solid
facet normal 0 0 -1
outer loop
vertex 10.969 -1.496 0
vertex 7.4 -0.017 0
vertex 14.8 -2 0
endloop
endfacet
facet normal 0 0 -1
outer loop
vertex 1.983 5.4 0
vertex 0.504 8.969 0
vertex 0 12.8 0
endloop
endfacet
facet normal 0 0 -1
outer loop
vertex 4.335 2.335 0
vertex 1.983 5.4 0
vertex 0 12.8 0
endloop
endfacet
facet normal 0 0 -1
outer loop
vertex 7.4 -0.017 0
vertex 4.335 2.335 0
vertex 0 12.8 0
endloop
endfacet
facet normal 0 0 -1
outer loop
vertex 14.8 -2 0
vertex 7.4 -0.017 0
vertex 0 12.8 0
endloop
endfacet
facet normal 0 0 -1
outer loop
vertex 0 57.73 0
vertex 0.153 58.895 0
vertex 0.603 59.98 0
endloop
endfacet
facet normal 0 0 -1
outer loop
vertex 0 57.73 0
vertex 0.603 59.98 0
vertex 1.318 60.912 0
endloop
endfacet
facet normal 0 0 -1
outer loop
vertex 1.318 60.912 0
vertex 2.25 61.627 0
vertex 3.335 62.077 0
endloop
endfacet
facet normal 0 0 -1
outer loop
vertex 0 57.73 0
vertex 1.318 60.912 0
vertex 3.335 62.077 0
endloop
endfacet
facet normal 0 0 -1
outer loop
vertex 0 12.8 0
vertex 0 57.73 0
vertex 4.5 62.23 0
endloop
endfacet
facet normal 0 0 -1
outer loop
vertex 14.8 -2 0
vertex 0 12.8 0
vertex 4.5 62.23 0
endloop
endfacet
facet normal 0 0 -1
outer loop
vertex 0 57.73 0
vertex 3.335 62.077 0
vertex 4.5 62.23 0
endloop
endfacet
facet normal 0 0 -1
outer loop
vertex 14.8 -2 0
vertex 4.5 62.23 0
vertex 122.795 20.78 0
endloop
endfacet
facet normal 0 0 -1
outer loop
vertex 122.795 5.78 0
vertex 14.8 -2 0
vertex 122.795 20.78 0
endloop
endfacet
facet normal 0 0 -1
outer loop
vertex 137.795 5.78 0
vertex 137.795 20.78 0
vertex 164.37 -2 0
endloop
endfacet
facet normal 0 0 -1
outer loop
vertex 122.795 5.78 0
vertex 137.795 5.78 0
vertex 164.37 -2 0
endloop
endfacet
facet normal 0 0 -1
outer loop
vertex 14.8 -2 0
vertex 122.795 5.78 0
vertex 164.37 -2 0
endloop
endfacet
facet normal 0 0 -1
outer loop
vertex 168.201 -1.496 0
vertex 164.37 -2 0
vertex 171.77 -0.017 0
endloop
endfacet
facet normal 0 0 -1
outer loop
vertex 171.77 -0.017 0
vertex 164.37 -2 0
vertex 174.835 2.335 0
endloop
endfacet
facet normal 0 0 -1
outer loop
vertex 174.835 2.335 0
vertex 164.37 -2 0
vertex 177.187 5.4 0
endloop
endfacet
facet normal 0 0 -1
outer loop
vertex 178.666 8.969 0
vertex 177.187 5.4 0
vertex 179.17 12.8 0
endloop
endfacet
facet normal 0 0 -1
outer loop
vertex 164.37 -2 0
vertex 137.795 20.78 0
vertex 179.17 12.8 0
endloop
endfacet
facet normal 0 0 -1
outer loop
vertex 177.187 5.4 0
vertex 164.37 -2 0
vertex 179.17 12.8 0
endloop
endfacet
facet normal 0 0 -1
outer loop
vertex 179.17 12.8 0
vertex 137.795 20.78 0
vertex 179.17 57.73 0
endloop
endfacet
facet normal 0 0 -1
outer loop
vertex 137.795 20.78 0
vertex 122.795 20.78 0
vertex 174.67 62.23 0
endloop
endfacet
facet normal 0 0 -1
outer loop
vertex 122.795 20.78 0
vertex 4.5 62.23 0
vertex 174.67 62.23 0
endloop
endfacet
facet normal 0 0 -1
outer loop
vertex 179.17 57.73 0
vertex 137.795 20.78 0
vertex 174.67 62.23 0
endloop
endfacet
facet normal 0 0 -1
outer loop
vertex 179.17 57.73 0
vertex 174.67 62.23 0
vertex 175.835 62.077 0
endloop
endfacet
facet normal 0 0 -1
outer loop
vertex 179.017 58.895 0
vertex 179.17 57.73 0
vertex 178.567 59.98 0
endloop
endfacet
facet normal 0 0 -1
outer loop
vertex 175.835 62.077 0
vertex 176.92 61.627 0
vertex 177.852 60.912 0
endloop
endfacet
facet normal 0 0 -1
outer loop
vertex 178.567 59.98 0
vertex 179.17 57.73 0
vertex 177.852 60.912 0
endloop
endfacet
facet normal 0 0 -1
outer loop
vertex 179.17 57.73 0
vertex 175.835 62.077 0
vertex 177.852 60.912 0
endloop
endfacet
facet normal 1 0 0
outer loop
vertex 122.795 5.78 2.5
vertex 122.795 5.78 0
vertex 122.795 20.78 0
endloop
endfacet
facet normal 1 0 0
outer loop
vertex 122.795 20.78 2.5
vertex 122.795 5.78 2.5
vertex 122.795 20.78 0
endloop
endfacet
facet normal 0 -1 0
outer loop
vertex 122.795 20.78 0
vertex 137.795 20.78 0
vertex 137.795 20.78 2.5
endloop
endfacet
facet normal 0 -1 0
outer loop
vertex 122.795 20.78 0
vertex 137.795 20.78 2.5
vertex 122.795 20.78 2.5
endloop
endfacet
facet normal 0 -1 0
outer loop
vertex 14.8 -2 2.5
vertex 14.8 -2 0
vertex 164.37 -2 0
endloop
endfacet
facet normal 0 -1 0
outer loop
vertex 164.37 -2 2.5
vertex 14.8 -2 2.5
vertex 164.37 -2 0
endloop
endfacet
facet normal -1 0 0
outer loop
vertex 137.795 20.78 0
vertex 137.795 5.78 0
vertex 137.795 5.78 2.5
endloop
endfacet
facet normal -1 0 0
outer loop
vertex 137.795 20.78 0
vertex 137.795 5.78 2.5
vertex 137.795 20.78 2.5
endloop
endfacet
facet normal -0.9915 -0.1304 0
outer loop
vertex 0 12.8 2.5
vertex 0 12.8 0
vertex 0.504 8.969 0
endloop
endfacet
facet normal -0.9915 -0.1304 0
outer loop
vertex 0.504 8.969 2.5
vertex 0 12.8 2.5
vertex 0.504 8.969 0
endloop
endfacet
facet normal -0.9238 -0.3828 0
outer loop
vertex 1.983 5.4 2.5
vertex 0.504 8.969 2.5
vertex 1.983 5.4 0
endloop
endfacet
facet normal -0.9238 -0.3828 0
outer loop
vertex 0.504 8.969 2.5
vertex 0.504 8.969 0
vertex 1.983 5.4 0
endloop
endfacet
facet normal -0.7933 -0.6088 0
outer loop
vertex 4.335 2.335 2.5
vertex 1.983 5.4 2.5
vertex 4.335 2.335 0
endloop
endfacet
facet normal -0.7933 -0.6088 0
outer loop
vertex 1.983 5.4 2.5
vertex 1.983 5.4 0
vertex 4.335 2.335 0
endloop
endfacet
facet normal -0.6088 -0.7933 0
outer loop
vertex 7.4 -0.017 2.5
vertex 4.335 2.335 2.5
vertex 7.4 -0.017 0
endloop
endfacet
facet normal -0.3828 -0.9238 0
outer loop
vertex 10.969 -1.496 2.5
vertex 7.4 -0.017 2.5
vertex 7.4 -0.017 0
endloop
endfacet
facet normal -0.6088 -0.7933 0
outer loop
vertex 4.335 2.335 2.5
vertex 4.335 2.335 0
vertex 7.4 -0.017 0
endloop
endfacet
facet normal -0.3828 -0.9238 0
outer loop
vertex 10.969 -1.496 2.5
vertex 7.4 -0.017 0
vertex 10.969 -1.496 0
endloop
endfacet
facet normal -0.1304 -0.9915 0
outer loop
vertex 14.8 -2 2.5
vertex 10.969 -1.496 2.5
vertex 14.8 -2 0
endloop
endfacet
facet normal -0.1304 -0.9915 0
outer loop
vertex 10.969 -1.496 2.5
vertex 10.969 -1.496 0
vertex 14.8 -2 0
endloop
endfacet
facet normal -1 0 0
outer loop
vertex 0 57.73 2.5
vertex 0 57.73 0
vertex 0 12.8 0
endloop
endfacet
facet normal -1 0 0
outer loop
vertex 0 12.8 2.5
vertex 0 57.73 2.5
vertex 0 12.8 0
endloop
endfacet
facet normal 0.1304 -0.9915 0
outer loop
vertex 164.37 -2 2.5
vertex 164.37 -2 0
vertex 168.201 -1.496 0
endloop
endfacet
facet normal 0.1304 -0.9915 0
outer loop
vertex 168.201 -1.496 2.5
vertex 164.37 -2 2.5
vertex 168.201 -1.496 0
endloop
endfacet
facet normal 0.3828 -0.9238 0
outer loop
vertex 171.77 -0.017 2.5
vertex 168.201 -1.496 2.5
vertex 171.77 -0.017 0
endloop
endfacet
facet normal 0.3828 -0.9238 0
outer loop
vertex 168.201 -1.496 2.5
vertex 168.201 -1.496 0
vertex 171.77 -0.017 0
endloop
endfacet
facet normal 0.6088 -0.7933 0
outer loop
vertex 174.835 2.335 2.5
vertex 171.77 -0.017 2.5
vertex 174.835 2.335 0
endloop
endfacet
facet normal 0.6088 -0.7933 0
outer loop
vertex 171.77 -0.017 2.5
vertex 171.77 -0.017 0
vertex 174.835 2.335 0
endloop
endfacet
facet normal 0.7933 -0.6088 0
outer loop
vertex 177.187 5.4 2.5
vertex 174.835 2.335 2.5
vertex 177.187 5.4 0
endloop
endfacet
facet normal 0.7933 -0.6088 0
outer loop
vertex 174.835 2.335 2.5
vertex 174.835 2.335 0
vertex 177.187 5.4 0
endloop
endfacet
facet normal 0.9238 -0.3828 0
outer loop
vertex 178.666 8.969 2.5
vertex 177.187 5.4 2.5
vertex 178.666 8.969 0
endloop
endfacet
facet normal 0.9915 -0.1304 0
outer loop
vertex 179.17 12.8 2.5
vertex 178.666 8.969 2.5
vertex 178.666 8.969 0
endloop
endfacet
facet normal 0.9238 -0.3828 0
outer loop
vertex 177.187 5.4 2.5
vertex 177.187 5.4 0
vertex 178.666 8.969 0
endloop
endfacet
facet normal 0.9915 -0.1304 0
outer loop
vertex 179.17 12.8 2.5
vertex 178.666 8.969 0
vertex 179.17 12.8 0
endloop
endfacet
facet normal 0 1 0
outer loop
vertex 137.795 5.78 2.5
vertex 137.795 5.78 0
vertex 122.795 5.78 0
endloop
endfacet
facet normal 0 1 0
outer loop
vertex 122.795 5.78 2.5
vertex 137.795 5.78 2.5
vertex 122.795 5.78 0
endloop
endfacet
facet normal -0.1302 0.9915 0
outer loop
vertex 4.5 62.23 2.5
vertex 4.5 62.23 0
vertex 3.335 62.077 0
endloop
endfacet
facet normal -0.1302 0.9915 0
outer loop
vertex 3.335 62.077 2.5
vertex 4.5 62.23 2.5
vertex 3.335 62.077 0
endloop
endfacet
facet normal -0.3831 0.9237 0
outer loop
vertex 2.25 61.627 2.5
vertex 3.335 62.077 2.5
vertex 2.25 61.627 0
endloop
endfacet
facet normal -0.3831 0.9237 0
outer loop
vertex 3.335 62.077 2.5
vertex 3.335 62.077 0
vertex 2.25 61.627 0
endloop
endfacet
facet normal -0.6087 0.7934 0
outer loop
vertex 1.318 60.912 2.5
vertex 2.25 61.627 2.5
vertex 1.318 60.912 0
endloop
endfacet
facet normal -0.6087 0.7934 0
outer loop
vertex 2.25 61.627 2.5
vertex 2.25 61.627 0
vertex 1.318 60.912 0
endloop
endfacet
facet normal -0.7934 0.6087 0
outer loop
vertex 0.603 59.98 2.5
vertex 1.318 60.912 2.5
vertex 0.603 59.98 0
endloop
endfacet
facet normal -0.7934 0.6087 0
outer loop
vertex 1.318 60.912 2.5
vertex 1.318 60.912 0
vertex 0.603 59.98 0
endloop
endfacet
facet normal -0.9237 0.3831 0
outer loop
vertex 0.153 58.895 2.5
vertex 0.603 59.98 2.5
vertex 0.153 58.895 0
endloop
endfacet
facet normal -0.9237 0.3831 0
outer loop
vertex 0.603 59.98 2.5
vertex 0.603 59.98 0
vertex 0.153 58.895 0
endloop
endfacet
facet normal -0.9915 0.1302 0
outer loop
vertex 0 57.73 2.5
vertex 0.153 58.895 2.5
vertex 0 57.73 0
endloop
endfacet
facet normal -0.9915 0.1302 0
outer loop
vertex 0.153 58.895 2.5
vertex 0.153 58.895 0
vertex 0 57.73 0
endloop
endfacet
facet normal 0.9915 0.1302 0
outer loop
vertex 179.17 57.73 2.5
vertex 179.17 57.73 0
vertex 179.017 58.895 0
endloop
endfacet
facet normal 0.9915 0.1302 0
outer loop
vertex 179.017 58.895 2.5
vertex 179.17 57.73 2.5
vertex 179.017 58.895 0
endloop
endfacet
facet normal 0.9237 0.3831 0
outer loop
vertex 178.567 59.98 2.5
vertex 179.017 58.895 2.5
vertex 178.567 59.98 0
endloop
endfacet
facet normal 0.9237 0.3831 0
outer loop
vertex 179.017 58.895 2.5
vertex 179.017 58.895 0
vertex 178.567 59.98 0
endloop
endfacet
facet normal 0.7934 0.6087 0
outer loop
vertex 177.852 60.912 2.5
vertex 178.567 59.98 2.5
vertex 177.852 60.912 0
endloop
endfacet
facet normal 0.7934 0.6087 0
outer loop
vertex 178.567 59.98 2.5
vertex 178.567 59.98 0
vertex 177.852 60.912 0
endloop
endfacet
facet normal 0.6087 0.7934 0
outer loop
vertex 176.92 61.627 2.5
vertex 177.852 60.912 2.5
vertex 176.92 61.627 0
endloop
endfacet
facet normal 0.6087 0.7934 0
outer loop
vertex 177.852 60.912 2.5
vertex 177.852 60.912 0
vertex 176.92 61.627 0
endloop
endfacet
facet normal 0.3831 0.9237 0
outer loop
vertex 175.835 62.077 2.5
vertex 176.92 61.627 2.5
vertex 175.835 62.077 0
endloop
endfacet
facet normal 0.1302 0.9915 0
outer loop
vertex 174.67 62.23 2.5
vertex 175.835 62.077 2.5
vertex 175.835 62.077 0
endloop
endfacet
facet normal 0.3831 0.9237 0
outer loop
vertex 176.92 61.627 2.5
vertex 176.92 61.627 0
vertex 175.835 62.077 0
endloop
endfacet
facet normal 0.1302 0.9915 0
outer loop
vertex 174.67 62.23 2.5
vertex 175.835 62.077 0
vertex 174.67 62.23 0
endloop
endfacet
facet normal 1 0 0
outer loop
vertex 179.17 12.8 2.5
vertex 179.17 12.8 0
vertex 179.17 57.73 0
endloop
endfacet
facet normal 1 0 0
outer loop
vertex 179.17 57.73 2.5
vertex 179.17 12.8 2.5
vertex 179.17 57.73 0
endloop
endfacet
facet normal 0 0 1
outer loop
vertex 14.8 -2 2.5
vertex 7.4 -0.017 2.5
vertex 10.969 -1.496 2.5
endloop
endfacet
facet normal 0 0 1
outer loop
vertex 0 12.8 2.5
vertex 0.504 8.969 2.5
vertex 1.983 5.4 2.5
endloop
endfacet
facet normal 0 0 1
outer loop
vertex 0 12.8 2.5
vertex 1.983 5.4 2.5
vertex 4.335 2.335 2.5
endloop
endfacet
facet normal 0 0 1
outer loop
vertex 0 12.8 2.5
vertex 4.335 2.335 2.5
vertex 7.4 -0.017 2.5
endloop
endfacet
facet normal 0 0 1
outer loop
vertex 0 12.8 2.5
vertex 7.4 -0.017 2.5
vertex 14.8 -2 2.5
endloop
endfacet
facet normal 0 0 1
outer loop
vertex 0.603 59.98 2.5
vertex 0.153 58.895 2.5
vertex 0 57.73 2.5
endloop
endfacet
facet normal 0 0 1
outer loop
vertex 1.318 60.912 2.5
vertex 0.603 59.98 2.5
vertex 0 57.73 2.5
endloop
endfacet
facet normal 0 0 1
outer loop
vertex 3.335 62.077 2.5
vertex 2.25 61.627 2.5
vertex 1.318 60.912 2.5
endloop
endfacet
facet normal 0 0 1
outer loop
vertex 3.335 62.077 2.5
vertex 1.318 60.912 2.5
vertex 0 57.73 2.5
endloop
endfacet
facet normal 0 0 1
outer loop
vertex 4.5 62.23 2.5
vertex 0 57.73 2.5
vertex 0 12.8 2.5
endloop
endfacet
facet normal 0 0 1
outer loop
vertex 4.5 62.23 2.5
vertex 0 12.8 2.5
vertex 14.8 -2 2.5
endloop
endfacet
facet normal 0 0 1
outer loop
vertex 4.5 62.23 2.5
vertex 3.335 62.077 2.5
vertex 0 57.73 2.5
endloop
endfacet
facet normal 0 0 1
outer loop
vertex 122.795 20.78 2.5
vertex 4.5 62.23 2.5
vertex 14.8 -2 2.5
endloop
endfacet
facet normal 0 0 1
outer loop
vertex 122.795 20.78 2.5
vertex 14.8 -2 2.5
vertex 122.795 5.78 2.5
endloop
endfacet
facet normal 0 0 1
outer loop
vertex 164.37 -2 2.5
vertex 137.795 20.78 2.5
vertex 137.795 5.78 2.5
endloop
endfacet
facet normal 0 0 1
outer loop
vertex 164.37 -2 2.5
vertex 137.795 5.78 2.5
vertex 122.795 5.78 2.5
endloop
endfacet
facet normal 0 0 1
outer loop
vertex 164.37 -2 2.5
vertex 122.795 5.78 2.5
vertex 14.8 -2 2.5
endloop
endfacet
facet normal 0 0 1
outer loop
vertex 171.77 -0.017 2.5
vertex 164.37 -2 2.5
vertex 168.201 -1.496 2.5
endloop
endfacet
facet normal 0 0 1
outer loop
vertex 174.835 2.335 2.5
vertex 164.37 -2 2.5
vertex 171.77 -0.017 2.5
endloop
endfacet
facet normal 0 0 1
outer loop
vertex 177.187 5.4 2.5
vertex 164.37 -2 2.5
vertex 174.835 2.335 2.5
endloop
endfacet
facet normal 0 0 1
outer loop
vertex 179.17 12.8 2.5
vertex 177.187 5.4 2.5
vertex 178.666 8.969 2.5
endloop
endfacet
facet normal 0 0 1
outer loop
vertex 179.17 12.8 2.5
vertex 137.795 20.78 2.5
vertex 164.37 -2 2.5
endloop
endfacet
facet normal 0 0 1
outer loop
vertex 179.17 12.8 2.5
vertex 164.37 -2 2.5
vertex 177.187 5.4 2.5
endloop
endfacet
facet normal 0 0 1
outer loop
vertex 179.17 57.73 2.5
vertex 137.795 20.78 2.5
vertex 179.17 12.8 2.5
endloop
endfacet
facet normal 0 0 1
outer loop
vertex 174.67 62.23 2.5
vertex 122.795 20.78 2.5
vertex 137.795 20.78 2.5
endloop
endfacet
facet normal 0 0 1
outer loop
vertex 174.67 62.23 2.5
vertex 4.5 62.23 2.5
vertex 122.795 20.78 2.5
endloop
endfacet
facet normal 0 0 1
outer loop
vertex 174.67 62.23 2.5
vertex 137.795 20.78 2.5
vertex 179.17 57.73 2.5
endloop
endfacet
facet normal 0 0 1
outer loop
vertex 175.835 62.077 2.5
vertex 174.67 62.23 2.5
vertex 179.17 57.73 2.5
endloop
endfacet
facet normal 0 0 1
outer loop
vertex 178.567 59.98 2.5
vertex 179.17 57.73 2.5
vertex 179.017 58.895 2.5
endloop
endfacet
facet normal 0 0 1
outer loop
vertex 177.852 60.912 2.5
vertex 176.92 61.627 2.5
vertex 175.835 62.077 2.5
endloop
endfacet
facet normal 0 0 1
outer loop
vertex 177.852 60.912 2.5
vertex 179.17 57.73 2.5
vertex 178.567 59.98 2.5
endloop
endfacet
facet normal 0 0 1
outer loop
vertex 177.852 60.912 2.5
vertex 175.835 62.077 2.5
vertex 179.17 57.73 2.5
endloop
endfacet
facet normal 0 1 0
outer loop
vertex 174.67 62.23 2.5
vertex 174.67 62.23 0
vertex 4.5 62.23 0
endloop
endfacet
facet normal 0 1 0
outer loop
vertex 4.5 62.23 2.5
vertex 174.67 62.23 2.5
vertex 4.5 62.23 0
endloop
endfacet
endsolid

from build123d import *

# Parameters (mm, degrees)
BOSS_EXTRU_1_DEPTH      = 2.5
ESQUISSE21_W            = 15
ESQUISSE21_H            = 15
ENL_V_MAT_EXTRU_1_DEPTH = 10


with BuildPart() as part:
    # Esquisse20 → Boss.-Extru.1 (new body)
    with BuildSketch(Plane.XY):
        with BuildLine():
            Line((14.8, -2), (164.37, -2))
            ThreePointArc((164.37, -2), (174.835180362, 2.334819638), (179.17, 12.8))
            Line((179.17, 12.8), (179.17, 57.73))
            ThreePointArc((179.17, 57.73), (177.851980515, 60.911980515), (174.67, 62.23))
            Line((174.67, 62.23), (4.5, 62.23))
            ThreePointArc((4.5, 62.23), (1.318019485, 60.911980515), (0, 57.73))
            Line((0, 57.73), (0, 12.8))
            ThreePointArc((0, 12.8), (4.334819638, 2.334819638), (14.8, -2))
        make_face()
    extrude(amount=BOSS_EXTRU_1_DEPTH)

    # Esquisse21 → Enlèv. mat.-Extru.1 (cut)
    with BuildSketch(Plane(origin=(0, 0, 0), x_dir=(-1, 0, 0), z_dir=(0, 0, -1))):
        with Locations((-130.294905016, 13.280151044)):
            Rectangle(ESQUISSE21_W, ESQUISSE21_H)
    extrude(amount=-ENL_V_MAT_EXTRU_1_DEPTH, mode=Mode.SUBTRACT)


solid = part.part
